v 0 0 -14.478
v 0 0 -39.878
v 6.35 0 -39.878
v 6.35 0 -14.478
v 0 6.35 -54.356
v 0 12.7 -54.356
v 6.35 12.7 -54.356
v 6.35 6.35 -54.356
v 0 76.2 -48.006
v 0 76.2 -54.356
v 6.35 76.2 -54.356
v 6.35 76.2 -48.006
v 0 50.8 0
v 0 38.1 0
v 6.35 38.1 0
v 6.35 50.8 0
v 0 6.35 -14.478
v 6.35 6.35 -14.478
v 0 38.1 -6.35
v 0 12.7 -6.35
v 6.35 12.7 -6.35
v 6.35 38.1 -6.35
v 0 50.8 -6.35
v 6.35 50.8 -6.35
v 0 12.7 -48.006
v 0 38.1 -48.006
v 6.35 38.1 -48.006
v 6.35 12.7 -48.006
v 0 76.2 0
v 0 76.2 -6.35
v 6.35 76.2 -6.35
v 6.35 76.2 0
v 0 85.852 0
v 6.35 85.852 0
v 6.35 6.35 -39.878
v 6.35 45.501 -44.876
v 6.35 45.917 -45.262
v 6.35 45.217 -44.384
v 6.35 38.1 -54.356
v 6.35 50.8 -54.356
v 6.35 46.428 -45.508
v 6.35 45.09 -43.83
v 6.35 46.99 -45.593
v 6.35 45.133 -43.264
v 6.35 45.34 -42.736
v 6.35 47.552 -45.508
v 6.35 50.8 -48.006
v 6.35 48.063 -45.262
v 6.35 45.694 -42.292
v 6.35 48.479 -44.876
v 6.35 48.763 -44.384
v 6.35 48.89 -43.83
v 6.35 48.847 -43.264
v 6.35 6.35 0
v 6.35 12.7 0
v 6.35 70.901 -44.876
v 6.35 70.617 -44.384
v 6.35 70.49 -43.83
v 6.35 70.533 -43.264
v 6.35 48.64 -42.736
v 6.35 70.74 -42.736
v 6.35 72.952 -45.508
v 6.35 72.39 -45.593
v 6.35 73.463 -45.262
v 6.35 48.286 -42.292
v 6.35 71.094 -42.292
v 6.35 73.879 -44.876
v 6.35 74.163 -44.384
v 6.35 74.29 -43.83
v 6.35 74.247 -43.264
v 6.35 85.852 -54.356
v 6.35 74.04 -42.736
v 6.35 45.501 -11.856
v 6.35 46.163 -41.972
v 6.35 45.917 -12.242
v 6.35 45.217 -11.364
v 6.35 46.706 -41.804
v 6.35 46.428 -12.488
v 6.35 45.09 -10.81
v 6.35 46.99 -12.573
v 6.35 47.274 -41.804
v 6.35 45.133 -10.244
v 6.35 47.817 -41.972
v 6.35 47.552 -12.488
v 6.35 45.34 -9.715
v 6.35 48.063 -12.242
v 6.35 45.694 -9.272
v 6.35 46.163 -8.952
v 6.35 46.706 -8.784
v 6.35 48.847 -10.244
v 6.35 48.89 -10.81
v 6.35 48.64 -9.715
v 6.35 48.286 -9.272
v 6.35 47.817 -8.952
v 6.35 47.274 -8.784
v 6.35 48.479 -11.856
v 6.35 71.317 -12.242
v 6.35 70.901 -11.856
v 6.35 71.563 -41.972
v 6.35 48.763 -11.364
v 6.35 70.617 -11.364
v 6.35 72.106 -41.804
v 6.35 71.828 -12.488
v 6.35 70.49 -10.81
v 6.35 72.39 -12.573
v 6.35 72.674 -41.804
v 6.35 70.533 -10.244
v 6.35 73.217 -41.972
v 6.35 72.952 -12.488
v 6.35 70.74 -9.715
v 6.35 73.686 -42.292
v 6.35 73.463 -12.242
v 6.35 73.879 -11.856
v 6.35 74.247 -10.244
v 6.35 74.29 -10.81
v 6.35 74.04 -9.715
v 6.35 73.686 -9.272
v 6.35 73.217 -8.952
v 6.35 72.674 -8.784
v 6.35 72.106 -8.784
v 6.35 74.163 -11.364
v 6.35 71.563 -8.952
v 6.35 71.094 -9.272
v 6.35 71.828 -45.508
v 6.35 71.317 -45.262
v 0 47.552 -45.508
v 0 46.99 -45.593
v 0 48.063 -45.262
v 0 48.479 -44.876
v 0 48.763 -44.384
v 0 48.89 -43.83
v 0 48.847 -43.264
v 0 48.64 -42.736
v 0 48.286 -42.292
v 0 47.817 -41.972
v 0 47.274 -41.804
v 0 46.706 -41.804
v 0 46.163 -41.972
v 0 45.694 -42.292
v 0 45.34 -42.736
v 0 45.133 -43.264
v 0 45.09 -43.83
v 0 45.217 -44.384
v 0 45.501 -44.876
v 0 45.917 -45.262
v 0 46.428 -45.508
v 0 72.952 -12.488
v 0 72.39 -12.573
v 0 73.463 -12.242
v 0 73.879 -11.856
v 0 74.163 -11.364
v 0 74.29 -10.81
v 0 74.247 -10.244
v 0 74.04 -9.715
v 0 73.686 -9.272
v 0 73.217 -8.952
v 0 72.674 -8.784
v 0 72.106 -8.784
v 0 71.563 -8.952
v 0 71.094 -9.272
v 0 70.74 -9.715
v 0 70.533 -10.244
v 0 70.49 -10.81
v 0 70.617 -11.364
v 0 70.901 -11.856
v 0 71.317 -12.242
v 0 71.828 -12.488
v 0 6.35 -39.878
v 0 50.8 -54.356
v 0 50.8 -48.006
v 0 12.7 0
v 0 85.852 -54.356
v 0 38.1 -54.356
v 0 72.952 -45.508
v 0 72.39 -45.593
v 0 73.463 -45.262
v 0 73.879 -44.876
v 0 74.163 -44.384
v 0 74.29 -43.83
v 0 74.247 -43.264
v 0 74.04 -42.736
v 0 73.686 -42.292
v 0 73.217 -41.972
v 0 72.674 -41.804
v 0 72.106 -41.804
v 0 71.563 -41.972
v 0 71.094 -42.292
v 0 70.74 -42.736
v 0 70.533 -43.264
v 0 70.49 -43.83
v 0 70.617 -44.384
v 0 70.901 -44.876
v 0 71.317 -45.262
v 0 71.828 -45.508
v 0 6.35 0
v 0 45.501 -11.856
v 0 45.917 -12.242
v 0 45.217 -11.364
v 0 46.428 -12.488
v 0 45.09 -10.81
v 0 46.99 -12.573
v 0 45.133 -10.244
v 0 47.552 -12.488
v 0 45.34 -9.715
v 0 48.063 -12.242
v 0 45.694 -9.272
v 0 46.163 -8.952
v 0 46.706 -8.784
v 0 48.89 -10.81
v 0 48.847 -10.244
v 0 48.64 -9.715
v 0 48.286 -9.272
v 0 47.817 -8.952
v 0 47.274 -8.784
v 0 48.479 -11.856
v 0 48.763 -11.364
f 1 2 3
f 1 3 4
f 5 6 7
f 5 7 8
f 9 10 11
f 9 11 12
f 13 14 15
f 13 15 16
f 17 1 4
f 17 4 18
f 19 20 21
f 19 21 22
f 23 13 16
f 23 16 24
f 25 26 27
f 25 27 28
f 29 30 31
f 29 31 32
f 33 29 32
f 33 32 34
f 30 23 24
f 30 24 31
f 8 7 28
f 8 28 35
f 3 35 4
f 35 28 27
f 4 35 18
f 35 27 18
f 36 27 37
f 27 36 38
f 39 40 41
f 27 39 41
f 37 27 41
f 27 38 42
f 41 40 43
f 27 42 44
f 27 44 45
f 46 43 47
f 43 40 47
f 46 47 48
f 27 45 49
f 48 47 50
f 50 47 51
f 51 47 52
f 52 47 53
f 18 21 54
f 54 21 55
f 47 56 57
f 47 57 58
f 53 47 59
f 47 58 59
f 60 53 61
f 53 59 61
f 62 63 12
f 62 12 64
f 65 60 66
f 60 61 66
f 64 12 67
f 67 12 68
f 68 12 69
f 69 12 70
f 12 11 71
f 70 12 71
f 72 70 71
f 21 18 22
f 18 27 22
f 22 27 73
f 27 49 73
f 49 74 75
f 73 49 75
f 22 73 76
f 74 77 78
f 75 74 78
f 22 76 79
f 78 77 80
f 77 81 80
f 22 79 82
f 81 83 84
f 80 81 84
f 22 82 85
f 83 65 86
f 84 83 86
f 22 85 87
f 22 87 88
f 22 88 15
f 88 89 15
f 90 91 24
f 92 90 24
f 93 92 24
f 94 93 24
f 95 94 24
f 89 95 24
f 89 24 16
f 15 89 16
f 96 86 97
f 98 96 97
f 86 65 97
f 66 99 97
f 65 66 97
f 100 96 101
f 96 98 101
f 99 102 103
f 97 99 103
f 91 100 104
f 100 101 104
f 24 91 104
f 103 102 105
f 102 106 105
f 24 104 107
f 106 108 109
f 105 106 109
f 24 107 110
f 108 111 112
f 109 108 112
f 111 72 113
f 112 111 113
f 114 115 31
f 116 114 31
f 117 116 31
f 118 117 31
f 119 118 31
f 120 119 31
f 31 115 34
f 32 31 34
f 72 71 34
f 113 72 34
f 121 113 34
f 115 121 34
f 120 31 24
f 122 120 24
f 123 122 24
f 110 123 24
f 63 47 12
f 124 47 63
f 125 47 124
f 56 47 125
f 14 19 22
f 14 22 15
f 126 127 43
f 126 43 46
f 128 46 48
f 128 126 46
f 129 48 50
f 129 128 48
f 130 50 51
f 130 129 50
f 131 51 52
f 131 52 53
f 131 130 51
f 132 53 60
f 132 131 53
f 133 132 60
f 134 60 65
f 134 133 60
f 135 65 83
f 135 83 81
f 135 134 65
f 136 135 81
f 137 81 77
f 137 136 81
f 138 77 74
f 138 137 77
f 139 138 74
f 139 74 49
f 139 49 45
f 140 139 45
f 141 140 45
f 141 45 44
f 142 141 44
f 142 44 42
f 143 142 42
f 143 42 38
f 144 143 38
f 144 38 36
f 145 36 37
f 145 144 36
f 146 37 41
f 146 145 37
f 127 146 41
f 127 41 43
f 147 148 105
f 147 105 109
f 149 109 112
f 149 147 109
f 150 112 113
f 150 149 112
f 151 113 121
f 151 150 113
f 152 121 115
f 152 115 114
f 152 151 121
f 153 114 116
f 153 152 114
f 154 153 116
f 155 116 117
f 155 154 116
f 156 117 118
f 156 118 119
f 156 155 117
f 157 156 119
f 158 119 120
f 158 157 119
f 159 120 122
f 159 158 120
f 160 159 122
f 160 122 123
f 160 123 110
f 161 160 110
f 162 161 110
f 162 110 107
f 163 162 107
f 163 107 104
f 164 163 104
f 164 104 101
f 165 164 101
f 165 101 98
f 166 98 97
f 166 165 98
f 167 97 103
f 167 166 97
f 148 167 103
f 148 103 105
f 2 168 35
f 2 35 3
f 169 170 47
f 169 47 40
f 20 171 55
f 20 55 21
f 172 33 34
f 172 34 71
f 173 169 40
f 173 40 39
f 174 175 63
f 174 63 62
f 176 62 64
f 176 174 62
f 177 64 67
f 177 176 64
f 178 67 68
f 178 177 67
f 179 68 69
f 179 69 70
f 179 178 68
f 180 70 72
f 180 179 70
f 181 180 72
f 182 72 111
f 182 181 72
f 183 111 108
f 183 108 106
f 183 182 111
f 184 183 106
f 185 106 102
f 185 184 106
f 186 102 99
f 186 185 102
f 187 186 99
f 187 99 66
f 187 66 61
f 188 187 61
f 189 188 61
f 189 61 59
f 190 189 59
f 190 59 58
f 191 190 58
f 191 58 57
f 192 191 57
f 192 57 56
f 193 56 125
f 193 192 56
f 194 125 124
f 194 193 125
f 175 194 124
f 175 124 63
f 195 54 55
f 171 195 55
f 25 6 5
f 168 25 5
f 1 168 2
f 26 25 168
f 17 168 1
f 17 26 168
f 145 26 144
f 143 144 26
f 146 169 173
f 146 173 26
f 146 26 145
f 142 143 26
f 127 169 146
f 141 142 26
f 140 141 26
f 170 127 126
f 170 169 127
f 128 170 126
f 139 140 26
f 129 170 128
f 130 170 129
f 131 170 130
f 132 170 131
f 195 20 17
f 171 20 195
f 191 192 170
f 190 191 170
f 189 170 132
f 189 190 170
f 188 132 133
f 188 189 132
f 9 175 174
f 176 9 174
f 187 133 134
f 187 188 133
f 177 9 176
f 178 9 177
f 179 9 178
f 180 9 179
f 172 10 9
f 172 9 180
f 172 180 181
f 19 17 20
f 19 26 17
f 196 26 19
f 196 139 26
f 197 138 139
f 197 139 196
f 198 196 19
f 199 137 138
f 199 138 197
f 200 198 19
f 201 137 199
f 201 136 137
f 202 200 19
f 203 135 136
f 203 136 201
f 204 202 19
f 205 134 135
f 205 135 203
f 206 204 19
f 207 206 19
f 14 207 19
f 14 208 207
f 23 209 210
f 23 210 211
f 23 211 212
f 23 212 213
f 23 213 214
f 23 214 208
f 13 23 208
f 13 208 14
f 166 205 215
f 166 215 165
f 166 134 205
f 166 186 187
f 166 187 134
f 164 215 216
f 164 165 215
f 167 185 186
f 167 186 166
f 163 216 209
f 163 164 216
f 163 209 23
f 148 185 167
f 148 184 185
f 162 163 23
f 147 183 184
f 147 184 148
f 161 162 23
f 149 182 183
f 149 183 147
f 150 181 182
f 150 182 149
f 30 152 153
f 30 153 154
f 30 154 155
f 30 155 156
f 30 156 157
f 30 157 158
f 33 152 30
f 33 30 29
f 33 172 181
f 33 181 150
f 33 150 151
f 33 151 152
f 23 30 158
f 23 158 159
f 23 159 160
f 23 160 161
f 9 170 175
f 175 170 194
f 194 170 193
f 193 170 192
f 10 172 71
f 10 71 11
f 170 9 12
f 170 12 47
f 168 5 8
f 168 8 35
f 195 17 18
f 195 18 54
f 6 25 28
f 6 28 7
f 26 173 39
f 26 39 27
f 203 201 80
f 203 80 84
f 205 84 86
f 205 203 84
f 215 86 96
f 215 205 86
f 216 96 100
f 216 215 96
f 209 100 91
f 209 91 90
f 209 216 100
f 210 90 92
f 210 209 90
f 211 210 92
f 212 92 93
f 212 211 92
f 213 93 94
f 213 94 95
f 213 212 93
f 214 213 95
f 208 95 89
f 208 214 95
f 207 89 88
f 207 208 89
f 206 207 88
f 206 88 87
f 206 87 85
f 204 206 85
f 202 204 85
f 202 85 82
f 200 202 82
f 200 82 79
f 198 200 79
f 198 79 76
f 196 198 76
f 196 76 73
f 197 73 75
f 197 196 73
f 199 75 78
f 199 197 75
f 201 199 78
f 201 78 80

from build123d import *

# Parameters (mm, degrees)
SKETCH1_R      = 1.905
EXTRUDE1_DEPTH = 6.35


with BuildPart() as part:
    # Sketch1 → Extrude1 (new body)
    with BuildSketch(Plane(origin=(0, 0, 0), x_dir=(0, 0, -1), z_dir=(1, 0, 0))):
        Polygon((14.478, 0), (14.478, 6.35), (0, 6.35), (0, 12.7), (6.35, 12.7), (6.35, 38.1), (0, 38.1), (0, 50.8), (6.35, 50.8), (6.35, 76.2), (0, 76.2), (0, 85.852), (54.356, 85.852), (54.356, 76.2), (48.006, 76.2), (48.006, 50.8), (54.356, 50.8), (54.356, 38.1), (48.006, 38.1), (48.006, 12.7), (54.356, 12.7), (54.356, 6.35), (39.878, 6.35), (39.878, 0), align=None)
        with Locations((10.668, 72.39)):
            Circle(SKETCH1_R, mode=Mode.SUBTRACT)
        with Locations((43.688, 72.39)):
            Circle(SKETCH1_R, mode=Mode.SUBTRACT)
        with Locations((43.688, 46.99)):
            Circle(SKETCH1_R, mode=Mode.SUBTRACT)
        with Locations((10.668, 46.99)):
            Circle(SKETCH1_R, mode=Mode.SUBTRACT)
    extrude(amount=EXTRUDE1_DEPTH)


solid = part.part
